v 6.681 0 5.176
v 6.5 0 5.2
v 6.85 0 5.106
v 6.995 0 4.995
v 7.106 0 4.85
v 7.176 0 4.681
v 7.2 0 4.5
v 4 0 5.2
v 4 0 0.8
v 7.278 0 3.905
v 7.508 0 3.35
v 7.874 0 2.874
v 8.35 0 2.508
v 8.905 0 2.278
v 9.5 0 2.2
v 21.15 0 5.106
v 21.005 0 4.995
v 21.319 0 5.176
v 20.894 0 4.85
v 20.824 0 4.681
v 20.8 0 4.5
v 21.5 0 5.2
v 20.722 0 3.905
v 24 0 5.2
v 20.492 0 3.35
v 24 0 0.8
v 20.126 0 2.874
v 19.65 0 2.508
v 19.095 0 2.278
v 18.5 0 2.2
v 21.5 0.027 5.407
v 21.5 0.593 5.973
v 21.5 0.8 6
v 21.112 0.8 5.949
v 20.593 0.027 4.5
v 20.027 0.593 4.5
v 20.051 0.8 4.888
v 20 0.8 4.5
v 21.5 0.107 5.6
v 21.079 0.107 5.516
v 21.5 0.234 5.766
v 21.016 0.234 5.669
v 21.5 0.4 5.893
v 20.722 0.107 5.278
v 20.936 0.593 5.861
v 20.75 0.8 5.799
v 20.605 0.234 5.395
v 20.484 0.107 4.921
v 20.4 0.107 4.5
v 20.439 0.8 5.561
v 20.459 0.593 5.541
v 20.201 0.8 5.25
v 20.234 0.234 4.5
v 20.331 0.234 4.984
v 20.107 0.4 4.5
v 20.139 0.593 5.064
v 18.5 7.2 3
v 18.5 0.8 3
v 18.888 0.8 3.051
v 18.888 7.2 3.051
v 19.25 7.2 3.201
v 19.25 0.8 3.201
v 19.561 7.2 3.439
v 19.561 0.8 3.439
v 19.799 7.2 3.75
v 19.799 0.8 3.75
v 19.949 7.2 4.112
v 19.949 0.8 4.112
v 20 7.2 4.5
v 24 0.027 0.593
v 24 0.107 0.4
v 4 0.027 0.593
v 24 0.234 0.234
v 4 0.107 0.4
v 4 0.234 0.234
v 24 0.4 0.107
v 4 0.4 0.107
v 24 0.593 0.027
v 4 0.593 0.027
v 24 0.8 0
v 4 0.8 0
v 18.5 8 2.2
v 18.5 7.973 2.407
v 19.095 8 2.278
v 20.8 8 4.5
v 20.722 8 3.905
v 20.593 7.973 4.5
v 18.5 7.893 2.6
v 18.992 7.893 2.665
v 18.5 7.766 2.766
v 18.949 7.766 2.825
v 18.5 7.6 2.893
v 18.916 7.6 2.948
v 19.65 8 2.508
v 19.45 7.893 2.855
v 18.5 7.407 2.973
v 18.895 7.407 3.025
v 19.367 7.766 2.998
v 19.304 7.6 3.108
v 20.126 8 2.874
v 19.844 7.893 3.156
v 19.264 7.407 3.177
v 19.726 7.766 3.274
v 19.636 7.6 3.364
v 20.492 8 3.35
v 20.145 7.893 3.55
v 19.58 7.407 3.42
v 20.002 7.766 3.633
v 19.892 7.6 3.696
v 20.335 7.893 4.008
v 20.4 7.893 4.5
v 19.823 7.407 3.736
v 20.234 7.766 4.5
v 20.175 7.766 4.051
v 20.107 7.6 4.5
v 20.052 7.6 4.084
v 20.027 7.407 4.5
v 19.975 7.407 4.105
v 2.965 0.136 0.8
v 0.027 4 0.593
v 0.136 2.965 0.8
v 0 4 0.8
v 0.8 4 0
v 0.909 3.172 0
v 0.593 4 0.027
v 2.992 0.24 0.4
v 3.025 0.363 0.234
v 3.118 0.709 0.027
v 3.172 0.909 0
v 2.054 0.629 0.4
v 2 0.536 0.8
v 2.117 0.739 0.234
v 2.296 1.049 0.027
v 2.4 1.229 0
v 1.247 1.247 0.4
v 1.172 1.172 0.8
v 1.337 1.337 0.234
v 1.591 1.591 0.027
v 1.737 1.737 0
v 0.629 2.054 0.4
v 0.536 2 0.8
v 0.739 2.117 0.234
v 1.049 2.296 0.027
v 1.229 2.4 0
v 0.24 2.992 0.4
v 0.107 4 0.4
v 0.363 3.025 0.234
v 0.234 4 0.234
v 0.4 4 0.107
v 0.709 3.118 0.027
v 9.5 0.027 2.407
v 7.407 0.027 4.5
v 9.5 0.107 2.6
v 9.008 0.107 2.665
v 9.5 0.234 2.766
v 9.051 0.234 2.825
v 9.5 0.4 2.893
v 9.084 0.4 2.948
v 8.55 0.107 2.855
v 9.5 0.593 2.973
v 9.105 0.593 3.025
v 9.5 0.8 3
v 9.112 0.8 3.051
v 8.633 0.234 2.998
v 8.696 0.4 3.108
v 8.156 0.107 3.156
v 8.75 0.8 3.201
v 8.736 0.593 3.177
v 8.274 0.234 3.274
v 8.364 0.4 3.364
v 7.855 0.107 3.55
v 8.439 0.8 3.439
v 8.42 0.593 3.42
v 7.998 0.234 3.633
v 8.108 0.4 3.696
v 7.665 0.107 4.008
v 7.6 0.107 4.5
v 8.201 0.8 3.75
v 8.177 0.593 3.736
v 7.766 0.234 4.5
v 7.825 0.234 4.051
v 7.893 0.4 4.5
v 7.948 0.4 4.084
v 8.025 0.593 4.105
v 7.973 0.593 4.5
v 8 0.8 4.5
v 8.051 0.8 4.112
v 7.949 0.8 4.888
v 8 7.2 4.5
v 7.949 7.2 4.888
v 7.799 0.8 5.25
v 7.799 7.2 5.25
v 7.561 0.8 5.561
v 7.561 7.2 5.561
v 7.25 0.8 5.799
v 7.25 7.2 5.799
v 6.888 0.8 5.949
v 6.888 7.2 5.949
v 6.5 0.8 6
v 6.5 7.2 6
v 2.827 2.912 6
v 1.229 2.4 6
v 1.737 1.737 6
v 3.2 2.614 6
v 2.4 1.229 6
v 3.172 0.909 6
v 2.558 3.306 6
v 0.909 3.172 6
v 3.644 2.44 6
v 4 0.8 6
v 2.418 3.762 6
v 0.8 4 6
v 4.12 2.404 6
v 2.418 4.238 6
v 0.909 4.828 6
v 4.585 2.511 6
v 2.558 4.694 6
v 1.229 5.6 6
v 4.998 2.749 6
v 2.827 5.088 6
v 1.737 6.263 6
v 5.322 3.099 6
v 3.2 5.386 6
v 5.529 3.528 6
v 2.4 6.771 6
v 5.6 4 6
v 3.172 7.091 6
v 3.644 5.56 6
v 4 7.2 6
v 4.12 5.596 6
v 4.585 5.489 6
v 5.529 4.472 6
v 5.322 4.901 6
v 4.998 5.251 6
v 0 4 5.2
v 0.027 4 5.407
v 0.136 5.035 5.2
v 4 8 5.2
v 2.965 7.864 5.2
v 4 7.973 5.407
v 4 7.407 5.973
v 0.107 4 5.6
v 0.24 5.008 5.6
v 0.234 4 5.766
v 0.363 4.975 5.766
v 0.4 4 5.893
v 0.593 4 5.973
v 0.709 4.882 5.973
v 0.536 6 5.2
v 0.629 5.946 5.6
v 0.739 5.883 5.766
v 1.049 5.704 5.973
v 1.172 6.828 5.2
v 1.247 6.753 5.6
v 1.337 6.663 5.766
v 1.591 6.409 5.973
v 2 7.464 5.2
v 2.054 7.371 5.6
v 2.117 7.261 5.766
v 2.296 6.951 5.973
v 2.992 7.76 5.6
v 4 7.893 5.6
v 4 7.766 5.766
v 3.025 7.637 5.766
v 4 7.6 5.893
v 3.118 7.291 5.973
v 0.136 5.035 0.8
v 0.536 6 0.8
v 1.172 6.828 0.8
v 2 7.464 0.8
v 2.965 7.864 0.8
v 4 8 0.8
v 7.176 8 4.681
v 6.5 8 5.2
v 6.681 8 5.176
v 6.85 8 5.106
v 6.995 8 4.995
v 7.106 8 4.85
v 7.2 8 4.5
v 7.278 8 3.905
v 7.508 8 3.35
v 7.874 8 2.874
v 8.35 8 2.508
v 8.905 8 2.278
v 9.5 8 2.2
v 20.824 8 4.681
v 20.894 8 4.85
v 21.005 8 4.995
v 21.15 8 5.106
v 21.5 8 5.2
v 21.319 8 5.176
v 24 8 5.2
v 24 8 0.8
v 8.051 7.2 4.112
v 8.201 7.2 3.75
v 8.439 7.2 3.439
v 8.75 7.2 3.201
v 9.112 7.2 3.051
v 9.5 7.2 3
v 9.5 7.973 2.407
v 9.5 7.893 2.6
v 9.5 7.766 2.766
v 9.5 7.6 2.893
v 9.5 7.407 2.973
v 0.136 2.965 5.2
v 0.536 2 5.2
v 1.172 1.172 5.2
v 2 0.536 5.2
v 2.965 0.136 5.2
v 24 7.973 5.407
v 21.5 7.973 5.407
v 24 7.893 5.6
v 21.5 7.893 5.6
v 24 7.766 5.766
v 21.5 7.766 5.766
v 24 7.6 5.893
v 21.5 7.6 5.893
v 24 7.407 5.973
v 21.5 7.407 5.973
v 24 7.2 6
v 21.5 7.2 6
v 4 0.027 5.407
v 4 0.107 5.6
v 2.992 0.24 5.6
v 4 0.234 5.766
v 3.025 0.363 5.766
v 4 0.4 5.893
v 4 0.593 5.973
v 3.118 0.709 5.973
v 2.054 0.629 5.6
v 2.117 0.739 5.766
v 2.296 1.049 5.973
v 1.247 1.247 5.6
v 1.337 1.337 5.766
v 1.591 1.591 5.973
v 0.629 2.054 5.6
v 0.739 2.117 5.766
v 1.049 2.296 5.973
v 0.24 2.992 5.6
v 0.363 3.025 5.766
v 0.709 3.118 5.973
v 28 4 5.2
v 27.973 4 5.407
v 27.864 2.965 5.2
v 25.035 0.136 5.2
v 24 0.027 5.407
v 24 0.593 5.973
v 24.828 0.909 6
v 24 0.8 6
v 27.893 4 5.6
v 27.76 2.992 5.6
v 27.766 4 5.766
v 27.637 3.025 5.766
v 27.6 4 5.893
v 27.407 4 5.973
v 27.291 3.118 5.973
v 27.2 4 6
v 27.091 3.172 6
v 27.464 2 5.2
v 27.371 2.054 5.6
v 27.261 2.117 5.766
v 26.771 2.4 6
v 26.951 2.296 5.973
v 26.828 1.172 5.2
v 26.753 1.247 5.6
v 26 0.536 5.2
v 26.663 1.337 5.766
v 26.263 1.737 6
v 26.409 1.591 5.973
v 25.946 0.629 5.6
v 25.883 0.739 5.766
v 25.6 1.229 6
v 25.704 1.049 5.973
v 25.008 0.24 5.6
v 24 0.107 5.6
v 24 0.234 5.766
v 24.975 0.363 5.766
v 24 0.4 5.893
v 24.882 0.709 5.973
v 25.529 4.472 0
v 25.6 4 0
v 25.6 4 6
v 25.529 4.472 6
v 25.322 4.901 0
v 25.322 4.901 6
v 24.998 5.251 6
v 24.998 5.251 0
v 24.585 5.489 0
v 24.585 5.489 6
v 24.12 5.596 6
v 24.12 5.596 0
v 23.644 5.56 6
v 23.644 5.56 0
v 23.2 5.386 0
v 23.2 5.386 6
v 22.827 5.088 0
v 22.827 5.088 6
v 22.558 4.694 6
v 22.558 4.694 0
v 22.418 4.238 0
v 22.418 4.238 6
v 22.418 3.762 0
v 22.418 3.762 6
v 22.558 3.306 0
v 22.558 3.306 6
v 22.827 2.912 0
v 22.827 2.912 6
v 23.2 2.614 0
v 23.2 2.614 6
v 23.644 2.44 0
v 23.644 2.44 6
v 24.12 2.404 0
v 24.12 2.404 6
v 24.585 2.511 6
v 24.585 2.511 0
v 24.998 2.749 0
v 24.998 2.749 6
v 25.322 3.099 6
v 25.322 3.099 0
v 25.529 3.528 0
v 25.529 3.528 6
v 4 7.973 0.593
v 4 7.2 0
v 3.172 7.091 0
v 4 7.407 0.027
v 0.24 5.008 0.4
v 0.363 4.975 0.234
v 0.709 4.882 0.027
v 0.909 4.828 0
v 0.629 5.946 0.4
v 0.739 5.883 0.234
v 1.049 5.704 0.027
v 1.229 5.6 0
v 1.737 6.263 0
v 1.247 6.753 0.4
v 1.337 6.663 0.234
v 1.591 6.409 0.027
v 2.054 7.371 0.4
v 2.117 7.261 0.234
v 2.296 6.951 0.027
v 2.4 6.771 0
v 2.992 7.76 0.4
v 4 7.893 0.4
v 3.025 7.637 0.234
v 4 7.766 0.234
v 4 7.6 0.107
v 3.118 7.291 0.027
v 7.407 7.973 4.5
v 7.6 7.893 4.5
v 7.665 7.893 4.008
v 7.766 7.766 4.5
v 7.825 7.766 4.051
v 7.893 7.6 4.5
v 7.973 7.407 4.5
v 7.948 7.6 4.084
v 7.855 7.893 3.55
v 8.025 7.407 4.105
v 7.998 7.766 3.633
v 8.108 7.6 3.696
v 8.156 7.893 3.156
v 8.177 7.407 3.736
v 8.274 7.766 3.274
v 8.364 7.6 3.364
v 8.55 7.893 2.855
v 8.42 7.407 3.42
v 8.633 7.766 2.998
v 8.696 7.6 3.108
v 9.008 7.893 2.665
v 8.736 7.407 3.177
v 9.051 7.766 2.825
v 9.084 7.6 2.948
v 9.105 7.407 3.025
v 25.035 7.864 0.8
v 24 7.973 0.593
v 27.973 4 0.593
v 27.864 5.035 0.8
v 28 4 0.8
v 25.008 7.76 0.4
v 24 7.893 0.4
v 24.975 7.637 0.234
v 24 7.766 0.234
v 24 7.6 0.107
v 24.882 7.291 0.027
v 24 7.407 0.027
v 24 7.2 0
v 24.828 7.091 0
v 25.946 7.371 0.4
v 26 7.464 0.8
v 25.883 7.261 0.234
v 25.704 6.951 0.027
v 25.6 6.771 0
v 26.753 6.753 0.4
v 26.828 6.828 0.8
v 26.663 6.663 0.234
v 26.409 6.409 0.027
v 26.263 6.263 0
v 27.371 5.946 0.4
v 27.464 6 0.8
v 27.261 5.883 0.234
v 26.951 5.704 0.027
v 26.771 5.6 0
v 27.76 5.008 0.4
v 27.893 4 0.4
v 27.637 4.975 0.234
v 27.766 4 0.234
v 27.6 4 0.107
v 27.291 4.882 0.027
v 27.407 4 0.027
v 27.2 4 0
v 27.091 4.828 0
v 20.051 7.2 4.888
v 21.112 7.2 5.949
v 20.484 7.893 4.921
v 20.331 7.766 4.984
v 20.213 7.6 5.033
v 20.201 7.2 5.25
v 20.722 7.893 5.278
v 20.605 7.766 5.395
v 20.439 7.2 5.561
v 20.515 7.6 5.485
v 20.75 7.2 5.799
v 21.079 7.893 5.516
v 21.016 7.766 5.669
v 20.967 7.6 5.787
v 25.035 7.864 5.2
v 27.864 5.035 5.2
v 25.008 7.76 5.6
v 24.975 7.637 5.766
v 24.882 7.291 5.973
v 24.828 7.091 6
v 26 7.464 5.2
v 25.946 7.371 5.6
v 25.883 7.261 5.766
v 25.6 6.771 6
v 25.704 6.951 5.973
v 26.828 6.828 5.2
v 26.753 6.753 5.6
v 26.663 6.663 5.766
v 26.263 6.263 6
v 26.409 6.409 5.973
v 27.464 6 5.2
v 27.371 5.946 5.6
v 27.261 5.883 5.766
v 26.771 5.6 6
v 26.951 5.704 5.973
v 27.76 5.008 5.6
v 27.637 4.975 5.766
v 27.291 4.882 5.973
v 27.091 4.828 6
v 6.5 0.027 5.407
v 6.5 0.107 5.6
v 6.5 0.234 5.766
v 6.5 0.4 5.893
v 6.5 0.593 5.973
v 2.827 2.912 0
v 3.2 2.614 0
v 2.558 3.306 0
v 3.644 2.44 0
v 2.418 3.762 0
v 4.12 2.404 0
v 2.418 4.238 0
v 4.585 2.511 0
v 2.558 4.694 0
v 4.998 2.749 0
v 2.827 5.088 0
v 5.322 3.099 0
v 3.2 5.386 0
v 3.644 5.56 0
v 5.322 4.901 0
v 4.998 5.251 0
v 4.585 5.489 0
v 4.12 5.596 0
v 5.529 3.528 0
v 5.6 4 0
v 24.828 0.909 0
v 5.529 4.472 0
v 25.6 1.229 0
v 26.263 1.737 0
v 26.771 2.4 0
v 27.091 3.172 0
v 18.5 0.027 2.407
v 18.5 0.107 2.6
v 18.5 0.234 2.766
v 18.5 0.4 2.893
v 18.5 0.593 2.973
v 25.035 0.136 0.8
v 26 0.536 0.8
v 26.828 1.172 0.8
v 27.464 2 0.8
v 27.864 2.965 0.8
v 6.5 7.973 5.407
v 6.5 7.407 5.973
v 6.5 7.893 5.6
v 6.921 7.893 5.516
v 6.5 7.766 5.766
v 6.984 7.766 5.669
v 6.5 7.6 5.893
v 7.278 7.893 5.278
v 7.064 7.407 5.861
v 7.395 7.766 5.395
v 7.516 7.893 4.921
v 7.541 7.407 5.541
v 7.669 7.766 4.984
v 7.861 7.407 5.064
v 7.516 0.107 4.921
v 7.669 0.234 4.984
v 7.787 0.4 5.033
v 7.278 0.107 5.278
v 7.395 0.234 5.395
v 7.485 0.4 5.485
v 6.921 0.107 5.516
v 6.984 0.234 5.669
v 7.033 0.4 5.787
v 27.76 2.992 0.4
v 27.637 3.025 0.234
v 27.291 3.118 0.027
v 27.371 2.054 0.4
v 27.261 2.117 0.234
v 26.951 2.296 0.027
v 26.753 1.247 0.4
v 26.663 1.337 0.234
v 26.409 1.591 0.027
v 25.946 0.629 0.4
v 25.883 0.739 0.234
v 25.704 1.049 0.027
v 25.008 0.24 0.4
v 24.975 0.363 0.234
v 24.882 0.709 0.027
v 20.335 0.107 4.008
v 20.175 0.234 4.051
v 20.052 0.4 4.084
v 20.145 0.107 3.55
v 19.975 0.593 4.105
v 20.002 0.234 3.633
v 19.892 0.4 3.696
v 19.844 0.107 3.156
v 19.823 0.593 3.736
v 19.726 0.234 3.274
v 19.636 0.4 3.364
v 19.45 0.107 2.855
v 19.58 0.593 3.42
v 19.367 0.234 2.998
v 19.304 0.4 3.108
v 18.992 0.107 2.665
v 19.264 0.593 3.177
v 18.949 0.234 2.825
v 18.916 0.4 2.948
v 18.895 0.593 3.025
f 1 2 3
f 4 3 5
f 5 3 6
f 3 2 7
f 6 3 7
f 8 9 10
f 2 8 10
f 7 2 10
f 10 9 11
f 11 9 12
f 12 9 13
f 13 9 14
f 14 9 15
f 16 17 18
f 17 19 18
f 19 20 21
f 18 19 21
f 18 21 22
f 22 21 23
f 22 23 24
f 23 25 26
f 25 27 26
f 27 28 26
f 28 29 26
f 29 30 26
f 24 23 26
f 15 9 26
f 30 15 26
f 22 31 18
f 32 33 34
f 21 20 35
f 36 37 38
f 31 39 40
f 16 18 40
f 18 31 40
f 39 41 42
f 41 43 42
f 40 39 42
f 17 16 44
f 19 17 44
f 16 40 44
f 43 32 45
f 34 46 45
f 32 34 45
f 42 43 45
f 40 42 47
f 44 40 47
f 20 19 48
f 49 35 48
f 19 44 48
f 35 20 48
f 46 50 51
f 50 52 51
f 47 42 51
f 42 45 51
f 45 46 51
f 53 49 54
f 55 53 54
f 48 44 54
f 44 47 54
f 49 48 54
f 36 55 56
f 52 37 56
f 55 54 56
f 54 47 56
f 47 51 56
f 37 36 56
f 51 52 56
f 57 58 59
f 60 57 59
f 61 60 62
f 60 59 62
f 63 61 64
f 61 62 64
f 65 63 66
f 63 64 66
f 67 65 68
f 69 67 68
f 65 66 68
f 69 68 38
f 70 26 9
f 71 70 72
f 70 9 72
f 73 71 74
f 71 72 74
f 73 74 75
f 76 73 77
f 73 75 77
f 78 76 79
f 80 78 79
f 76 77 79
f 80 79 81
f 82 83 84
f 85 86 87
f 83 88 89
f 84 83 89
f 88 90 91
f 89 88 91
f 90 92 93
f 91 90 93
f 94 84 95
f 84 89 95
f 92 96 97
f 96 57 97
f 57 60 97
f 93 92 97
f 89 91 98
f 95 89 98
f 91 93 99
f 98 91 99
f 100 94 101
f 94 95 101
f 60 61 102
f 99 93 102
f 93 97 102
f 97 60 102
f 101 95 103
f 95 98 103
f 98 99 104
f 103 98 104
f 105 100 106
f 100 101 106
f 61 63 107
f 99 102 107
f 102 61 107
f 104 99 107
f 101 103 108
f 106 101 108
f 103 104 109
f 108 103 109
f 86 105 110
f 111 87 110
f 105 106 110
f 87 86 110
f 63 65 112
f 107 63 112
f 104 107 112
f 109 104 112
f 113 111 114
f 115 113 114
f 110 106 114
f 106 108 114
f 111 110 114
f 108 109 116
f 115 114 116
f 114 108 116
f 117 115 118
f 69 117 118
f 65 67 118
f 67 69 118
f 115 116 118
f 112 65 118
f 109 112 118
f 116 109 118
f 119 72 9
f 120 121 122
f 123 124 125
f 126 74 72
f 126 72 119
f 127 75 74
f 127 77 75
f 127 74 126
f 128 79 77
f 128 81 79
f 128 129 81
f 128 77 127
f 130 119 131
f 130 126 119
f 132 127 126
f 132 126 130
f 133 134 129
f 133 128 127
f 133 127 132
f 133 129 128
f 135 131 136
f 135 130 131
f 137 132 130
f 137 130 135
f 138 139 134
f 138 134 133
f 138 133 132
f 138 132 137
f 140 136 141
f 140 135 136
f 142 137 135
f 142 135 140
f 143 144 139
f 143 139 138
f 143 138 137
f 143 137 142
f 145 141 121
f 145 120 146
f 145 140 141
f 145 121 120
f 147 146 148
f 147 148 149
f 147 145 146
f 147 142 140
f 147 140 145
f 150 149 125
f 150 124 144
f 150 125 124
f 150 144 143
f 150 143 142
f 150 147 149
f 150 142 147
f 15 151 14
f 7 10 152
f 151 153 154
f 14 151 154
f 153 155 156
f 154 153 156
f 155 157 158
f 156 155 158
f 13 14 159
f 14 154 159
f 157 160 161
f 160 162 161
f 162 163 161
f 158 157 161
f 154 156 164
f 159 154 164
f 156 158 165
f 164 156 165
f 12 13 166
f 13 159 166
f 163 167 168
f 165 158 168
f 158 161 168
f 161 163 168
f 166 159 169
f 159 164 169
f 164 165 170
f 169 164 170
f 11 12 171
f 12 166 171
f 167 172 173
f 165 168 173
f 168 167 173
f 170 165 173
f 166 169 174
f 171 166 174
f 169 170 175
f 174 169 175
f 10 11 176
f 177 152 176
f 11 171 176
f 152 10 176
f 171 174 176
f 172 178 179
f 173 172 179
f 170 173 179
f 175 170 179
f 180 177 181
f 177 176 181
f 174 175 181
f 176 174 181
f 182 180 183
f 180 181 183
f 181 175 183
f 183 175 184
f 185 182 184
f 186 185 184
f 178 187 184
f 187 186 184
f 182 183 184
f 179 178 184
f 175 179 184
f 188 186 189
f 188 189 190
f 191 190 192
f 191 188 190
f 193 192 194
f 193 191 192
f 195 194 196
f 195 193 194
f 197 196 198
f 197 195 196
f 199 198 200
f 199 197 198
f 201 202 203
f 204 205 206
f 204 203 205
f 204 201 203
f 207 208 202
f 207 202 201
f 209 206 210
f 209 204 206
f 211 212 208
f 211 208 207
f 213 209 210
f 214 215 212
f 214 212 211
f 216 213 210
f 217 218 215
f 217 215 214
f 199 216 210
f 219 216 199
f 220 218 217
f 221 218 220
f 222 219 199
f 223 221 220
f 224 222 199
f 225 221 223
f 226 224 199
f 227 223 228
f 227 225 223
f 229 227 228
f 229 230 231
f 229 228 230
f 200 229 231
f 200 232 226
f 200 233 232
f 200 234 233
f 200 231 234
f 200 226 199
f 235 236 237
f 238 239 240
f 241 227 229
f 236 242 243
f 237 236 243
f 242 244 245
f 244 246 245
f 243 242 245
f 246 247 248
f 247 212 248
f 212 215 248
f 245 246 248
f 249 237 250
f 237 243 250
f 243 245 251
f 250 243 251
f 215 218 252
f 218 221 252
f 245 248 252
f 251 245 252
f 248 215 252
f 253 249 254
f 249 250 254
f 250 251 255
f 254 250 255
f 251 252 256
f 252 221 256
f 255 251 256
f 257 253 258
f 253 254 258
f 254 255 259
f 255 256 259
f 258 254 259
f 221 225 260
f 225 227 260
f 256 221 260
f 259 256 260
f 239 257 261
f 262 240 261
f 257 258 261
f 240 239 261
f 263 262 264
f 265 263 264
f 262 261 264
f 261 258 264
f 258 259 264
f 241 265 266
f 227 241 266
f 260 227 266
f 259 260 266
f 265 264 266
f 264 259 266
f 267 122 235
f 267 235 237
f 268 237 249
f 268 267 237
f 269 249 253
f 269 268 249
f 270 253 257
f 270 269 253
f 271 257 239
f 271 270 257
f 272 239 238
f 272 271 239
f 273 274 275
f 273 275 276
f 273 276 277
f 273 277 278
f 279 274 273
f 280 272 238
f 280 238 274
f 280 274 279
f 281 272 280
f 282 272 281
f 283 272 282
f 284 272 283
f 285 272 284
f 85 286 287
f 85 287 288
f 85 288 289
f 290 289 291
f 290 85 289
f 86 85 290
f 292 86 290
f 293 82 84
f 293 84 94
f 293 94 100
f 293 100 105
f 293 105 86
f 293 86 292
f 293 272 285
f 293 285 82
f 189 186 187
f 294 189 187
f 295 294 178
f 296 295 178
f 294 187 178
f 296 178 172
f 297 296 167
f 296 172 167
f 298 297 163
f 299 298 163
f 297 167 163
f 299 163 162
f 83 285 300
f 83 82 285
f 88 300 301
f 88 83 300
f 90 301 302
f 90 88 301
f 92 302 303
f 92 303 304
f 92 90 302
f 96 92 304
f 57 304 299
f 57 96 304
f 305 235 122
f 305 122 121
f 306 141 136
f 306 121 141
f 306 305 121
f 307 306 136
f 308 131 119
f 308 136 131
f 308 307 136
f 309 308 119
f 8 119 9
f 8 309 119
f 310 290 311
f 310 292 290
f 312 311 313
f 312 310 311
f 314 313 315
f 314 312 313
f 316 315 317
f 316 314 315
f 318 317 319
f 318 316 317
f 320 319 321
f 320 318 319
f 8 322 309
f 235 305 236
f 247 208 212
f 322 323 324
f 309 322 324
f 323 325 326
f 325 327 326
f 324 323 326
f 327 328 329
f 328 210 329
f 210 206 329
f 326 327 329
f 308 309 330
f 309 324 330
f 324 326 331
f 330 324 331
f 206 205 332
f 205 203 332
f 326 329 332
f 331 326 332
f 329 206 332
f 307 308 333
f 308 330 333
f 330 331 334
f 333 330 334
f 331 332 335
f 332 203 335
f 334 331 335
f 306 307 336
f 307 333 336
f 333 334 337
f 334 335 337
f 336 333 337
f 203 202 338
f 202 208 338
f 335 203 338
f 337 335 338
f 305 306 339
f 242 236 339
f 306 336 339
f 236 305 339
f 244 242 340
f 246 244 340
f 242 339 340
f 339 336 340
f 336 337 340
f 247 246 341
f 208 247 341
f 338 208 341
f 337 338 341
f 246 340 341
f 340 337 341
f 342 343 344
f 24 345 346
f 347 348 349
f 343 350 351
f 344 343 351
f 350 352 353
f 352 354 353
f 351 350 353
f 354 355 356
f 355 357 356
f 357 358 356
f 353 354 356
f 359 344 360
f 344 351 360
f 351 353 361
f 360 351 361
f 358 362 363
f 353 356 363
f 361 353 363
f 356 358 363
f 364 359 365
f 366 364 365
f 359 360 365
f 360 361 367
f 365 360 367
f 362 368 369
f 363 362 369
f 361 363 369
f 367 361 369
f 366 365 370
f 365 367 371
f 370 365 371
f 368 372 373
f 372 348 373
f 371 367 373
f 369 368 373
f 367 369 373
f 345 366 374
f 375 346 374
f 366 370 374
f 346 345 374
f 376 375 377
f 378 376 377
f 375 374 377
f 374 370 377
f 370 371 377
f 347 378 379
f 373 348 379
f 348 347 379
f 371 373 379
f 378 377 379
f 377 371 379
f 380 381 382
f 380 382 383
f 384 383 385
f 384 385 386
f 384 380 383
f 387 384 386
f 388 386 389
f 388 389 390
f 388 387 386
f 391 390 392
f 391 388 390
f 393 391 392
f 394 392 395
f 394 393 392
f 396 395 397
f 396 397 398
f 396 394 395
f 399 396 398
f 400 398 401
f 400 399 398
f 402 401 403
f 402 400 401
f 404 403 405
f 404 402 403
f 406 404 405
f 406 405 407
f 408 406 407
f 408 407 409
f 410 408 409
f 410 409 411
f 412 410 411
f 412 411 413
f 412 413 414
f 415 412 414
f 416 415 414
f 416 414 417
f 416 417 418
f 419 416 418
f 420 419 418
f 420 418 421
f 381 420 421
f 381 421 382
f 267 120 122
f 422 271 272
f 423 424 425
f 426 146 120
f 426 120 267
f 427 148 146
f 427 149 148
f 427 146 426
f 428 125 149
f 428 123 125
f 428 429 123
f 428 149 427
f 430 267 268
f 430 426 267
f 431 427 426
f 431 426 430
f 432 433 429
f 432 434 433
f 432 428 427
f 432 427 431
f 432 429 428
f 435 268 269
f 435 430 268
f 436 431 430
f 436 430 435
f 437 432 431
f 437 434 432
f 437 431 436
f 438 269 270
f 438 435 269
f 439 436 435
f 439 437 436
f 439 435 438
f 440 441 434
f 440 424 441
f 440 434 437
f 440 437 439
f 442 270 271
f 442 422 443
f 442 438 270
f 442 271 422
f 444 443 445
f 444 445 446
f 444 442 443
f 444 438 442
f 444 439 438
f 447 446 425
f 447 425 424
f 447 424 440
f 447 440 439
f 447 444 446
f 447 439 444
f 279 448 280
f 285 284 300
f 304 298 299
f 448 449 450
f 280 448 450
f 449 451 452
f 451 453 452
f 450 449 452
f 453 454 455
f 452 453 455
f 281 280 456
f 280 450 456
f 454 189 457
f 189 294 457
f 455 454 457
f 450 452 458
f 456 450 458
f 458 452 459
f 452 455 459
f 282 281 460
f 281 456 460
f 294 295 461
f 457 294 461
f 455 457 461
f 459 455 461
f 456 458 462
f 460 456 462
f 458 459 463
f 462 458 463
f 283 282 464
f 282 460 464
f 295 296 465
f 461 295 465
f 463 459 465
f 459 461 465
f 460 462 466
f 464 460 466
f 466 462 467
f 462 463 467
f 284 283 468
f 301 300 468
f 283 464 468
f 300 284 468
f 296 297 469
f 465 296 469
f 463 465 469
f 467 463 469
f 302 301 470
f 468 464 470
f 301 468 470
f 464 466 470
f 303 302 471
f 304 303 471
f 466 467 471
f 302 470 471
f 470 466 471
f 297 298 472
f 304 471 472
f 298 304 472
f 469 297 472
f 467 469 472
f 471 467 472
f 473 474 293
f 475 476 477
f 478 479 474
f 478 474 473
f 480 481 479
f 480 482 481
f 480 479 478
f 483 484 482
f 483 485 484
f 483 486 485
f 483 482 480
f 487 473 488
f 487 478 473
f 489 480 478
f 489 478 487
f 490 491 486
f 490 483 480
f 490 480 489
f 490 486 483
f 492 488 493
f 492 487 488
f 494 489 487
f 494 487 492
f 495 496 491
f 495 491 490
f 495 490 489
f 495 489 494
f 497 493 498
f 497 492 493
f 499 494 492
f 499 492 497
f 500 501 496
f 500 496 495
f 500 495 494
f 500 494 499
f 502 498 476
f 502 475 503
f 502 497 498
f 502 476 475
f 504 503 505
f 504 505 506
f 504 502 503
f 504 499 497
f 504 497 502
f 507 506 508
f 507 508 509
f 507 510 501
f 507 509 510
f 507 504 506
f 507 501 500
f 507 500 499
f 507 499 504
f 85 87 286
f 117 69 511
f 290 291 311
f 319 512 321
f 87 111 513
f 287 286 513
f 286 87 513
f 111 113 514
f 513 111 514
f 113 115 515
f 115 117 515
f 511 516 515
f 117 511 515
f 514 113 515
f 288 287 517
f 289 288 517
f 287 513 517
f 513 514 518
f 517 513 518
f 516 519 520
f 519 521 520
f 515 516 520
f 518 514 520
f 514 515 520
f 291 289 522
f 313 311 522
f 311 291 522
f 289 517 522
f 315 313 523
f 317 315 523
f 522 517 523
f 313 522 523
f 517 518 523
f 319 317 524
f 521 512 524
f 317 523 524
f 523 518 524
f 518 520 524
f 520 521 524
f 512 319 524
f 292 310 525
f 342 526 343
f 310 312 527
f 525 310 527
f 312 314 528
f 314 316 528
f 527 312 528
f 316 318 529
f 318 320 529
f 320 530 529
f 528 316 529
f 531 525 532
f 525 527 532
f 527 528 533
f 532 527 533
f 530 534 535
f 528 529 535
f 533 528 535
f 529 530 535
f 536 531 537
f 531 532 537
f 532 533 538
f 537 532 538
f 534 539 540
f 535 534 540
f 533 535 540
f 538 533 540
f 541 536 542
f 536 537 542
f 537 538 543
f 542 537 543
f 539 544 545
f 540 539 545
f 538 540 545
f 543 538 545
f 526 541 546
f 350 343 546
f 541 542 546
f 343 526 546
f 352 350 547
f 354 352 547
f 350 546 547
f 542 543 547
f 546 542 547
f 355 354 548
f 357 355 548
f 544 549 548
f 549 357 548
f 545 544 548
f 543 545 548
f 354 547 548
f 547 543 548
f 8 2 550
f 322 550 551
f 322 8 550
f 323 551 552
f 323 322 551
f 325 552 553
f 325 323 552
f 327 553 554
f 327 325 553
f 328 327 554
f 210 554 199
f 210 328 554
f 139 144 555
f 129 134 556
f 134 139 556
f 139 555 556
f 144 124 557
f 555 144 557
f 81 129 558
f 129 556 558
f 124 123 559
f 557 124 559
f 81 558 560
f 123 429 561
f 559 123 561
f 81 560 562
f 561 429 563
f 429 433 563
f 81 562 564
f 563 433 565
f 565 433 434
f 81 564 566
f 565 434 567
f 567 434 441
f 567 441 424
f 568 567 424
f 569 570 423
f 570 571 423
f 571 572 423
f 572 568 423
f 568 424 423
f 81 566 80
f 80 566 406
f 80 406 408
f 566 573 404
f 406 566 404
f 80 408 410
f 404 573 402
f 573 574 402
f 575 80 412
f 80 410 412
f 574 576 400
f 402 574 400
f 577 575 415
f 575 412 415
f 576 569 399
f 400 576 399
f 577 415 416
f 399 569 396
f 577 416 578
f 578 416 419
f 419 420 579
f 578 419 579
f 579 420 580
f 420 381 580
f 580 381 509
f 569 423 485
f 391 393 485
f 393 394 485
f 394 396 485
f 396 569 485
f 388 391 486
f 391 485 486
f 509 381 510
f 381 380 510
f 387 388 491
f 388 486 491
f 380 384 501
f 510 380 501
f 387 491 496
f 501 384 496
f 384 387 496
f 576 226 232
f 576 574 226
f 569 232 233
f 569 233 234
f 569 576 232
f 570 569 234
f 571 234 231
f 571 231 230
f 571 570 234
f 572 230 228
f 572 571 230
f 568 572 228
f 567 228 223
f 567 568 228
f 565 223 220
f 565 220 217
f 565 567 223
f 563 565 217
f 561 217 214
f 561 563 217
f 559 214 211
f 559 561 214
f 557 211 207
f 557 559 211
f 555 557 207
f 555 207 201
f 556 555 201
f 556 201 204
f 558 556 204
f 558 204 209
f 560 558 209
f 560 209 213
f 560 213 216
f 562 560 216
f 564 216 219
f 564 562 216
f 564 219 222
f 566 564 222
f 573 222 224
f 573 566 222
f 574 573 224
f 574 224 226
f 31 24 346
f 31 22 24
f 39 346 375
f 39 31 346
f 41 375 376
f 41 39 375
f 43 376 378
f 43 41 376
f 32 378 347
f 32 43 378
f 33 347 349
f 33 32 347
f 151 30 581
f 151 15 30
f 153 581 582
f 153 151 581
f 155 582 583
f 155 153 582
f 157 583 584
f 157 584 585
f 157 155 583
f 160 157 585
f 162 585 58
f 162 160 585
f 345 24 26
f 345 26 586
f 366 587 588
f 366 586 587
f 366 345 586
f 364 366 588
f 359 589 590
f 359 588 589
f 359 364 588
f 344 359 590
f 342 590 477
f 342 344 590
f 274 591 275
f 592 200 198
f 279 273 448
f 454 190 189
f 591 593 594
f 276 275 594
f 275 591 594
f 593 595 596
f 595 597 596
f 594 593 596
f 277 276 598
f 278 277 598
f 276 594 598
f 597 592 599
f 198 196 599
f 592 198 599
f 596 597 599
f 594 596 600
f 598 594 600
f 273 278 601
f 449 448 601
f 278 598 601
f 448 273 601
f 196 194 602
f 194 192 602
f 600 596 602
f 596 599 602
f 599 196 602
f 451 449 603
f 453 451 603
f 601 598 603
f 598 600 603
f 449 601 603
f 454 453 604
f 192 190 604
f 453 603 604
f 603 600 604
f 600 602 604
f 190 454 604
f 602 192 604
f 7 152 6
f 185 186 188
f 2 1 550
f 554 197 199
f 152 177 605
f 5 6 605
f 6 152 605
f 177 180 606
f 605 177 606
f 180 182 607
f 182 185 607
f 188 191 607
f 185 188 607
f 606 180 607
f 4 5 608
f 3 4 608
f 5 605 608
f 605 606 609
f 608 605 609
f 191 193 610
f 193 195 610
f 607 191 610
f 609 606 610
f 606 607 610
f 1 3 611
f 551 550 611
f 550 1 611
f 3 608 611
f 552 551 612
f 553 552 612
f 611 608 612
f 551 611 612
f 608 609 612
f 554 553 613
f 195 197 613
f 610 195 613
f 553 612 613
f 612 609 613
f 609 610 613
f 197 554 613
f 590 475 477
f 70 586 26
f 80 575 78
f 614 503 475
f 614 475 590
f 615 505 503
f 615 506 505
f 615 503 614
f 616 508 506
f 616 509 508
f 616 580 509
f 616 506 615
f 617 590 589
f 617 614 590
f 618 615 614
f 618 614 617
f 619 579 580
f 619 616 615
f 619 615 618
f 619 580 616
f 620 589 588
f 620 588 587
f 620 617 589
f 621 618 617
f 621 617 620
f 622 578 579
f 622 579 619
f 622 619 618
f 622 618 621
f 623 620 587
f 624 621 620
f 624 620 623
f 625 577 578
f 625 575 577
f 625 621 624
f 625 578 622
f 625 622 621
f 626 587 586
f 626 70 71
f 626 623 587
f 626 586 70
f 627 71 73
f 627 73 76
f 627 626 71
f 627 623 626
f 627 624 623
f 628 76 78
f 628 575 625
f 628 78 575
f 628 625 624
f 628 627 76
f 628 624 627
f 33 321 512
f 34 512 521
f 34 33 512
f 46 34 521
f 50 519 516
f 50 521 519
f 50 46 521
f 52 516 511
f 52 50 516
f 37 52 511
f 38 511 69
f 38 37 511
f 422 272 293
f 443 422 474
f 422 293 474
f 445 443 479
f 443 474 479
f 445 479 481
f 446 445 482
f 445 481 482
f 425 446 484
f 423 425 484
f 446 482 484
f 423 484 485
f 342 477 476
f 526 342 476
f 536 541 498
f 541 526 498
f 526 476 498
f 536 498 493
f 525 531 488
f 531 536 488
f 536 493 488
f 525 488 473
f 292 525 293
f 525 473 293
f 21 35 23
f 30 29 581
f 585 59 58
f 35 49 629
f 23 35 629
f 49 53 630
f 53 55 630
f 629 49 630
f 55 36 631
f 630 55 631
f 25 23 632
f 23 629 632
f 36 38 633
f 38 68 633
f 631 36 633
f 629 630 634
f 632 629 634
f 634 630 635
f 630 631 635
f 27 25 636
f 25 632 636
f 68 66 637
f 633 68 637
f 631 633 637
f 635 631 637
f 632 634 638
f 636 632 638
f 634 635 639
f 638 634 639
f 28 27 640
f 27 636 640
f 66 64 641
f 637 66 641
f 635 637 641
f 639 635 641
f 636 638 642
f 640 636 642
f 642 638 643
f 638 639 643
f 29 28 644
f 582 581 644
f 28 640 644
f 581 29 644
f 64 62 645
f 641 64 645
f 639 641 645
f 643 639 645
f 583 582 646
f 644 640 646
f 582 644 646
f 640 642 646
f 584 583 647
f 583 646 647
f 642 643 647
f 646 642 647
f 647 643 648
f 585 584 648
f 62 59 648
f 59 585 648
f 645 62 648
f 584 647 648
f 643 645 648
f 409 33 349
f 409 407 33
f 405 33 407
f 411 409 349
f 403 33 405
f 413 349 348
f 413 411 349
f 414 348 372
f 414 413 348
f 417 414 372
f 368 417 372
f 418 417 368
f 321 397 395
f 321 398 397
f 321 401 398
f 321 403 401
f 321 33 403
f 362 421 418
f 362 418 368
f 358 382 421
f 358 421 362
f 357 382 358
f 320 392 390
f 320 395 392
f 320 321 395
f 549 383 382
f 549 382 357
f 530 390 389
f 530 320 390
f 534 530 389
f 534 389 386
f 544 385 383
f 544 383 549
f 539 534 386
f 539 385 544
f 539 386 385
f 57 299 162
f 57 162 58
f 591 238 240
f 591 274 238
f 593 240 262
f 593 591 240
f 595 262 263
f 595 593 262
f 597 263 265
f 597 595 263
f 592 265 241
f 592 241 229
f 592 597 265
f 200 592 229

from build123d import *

# Parameters (mm, degrees)
SKETCH1_W           = 28
SKETCH1_H           = 8
SKETCH1_R           = 1.6
BOSS_EXTRUDE1_DEPTH = 3
SKETCH2_W           = 8
SKETCH2_H           = 8
SKETCH2_R           = 1.6
BOSS_EXTRUDE2_DEPTH = 3
FILLET1_R           = 4
FILLET2_START       = -1
FILLET2_DEPTH       = 10
FILLET2_2_DEPTH     = 8
FILLET3_R           = 0.8


with BuildPart() as part:
    # Sketch1 → Boss-Extrude1 (new body)
    with BuildSketch(Plane.XY):
        with Locations((14, 4)):
            Rectangle(SKETCH1_W, SKETCH1_H)
        with Locations((4, 4)):
            Circle(SKETCH1_R, mode=Mode.SUBTRACT)
        with Locations((24, 4)):
            Circle(SKETCH1_R, mode=Mode.SUBTRACT)
    extrude(amount=BOSS_EXTRUDE1_DEPTH)

    # Sketch2 → Boss-Extrude2 (add)
    # profile 1 of 2: a face of its own
    with BuildSketch(Plane.XY.offset(3)):
        with Locations((4, 4)):
            Rectangle(SKETCH2_W, SKETCH2_H)
        with Locations((4, 4)):
            Circle(SKETCH2_R, mode=Mode.SUBTRACT)
    # profile 2 of 2: a face of its own
    with BuildSketch(Plane.XY.offset(3)):
        with Locations((24, 4)):
            Rectangle(SKETCH2_W, SKETCH2_H)
        with Locations((24, 4)):
            Circle(SKETCH2_R, mode=Mode.SUBTRACT)
    extrude(amount=BOSS_EXTRUDE2_DEPTH)

    # Fillet1
    fillet1_edges = [part.edges().sort_by_distance(p)[0] for p in [
        (28, 8, 3),
        (28, 0, 3),
        (0, 8, 3),
        (0, 0, 3),
    ]]
    fillet(fillet1_edges, radius=FILLET1_R - 0.0001)  # a hair under: the kernel refuses the full size

    # Fillet2: read off the stored shape, not the designer's step
    # Fillet2 outline → Fillet2 (cut)
    with BuildSketch(Plane(origin=(0, 0, 0), x_dir=(1, 0, 0), z_dir=(0, 1, 0)).offset(FILLET2_START)):
        with BuildLine():
            Line((8, -6), (8, -4.5))
            ThreePointArc((8, -4.5), (7.560660172, -5.560660172), (6.5, -6))
            Line((6.5, -6), (8, -6))
        make_face()
        with BuildLine():
            ThreePointArc((21.5, -6), (20.439339828, -5.560660172), (20, -4.5))
            Line((20, -4.5), (20, -6))
            Line((20, -6), (21.5, -6))
        make_face()
    extrude(amount=FILLET2_DEPTH, mode=Mode.SUBTRACT)

    # Fillet2 2 outline → Fillet2 2 (add)
    with BuildSketch(Plane(origin=(0, 0, 0), x_dir=(1, 0, 0), z_dir=(0, 1, 0))):
        with BuildLine():
            Line((8, -3), (8, -4.5))
            ThreePointArc((8, -4.5), (8.439339828, -3.439339828), (9.5, -3))
            Line((9.5, -3), (8, -3))
        make_face()
        with BuildLine():
            Line((20, -3), (18.5, -3))
            ThreePointArc((18.5, -3), (19.560660172, -3.439339828), (20, -4.5))
            Line((20, -4.5), (20, -3))
        make_face()
    extrude(amount=FILLET2_2_DEPTH)

    # Fillet3
    fillet3_edges = [part.edges().sort_by_distance(p)[0] for p in [
        (14, 8, 0),
        (22.75005, 8, 6),
        (14, 0, 0),
        (1.171543586, 1.171543586, 0),
        (1.171543586, 6.828456414, 0),
        (26.828456414, 1.171543586, 0),
        (26.828456414, 6.828456414, 0),
        (26.828456414, 1.171543586, 6),
        (26.828456414, 6.828456414, 6),
        (5.24995, 0, 6),
        (1.171543586, 1.171543586, 6),
        (1.171543586, 6.828456414, 6),
        (5.24995, 8, 6),
        (14, 8, 3),
        (20.439339828, 8, 5.560660172),
        (7.560660172, 8, 5.560660172),
        (22.75005, 0, 6),
        (14, 0, 3),
        (20.439339828, 0, 5.560660172),
        (7.560660172, 0, 5.560660172),
        (19.560660172, 0, 3.439339828),
        (19.560660172, 8, 3.439339828),
        (8.439339828, 8, 3.439339828),
        (8.439339828, 0, 3.439339828),
    ]]
    fillet(fillet3_edges, radius=FILLET3_R)


solid = part.part
